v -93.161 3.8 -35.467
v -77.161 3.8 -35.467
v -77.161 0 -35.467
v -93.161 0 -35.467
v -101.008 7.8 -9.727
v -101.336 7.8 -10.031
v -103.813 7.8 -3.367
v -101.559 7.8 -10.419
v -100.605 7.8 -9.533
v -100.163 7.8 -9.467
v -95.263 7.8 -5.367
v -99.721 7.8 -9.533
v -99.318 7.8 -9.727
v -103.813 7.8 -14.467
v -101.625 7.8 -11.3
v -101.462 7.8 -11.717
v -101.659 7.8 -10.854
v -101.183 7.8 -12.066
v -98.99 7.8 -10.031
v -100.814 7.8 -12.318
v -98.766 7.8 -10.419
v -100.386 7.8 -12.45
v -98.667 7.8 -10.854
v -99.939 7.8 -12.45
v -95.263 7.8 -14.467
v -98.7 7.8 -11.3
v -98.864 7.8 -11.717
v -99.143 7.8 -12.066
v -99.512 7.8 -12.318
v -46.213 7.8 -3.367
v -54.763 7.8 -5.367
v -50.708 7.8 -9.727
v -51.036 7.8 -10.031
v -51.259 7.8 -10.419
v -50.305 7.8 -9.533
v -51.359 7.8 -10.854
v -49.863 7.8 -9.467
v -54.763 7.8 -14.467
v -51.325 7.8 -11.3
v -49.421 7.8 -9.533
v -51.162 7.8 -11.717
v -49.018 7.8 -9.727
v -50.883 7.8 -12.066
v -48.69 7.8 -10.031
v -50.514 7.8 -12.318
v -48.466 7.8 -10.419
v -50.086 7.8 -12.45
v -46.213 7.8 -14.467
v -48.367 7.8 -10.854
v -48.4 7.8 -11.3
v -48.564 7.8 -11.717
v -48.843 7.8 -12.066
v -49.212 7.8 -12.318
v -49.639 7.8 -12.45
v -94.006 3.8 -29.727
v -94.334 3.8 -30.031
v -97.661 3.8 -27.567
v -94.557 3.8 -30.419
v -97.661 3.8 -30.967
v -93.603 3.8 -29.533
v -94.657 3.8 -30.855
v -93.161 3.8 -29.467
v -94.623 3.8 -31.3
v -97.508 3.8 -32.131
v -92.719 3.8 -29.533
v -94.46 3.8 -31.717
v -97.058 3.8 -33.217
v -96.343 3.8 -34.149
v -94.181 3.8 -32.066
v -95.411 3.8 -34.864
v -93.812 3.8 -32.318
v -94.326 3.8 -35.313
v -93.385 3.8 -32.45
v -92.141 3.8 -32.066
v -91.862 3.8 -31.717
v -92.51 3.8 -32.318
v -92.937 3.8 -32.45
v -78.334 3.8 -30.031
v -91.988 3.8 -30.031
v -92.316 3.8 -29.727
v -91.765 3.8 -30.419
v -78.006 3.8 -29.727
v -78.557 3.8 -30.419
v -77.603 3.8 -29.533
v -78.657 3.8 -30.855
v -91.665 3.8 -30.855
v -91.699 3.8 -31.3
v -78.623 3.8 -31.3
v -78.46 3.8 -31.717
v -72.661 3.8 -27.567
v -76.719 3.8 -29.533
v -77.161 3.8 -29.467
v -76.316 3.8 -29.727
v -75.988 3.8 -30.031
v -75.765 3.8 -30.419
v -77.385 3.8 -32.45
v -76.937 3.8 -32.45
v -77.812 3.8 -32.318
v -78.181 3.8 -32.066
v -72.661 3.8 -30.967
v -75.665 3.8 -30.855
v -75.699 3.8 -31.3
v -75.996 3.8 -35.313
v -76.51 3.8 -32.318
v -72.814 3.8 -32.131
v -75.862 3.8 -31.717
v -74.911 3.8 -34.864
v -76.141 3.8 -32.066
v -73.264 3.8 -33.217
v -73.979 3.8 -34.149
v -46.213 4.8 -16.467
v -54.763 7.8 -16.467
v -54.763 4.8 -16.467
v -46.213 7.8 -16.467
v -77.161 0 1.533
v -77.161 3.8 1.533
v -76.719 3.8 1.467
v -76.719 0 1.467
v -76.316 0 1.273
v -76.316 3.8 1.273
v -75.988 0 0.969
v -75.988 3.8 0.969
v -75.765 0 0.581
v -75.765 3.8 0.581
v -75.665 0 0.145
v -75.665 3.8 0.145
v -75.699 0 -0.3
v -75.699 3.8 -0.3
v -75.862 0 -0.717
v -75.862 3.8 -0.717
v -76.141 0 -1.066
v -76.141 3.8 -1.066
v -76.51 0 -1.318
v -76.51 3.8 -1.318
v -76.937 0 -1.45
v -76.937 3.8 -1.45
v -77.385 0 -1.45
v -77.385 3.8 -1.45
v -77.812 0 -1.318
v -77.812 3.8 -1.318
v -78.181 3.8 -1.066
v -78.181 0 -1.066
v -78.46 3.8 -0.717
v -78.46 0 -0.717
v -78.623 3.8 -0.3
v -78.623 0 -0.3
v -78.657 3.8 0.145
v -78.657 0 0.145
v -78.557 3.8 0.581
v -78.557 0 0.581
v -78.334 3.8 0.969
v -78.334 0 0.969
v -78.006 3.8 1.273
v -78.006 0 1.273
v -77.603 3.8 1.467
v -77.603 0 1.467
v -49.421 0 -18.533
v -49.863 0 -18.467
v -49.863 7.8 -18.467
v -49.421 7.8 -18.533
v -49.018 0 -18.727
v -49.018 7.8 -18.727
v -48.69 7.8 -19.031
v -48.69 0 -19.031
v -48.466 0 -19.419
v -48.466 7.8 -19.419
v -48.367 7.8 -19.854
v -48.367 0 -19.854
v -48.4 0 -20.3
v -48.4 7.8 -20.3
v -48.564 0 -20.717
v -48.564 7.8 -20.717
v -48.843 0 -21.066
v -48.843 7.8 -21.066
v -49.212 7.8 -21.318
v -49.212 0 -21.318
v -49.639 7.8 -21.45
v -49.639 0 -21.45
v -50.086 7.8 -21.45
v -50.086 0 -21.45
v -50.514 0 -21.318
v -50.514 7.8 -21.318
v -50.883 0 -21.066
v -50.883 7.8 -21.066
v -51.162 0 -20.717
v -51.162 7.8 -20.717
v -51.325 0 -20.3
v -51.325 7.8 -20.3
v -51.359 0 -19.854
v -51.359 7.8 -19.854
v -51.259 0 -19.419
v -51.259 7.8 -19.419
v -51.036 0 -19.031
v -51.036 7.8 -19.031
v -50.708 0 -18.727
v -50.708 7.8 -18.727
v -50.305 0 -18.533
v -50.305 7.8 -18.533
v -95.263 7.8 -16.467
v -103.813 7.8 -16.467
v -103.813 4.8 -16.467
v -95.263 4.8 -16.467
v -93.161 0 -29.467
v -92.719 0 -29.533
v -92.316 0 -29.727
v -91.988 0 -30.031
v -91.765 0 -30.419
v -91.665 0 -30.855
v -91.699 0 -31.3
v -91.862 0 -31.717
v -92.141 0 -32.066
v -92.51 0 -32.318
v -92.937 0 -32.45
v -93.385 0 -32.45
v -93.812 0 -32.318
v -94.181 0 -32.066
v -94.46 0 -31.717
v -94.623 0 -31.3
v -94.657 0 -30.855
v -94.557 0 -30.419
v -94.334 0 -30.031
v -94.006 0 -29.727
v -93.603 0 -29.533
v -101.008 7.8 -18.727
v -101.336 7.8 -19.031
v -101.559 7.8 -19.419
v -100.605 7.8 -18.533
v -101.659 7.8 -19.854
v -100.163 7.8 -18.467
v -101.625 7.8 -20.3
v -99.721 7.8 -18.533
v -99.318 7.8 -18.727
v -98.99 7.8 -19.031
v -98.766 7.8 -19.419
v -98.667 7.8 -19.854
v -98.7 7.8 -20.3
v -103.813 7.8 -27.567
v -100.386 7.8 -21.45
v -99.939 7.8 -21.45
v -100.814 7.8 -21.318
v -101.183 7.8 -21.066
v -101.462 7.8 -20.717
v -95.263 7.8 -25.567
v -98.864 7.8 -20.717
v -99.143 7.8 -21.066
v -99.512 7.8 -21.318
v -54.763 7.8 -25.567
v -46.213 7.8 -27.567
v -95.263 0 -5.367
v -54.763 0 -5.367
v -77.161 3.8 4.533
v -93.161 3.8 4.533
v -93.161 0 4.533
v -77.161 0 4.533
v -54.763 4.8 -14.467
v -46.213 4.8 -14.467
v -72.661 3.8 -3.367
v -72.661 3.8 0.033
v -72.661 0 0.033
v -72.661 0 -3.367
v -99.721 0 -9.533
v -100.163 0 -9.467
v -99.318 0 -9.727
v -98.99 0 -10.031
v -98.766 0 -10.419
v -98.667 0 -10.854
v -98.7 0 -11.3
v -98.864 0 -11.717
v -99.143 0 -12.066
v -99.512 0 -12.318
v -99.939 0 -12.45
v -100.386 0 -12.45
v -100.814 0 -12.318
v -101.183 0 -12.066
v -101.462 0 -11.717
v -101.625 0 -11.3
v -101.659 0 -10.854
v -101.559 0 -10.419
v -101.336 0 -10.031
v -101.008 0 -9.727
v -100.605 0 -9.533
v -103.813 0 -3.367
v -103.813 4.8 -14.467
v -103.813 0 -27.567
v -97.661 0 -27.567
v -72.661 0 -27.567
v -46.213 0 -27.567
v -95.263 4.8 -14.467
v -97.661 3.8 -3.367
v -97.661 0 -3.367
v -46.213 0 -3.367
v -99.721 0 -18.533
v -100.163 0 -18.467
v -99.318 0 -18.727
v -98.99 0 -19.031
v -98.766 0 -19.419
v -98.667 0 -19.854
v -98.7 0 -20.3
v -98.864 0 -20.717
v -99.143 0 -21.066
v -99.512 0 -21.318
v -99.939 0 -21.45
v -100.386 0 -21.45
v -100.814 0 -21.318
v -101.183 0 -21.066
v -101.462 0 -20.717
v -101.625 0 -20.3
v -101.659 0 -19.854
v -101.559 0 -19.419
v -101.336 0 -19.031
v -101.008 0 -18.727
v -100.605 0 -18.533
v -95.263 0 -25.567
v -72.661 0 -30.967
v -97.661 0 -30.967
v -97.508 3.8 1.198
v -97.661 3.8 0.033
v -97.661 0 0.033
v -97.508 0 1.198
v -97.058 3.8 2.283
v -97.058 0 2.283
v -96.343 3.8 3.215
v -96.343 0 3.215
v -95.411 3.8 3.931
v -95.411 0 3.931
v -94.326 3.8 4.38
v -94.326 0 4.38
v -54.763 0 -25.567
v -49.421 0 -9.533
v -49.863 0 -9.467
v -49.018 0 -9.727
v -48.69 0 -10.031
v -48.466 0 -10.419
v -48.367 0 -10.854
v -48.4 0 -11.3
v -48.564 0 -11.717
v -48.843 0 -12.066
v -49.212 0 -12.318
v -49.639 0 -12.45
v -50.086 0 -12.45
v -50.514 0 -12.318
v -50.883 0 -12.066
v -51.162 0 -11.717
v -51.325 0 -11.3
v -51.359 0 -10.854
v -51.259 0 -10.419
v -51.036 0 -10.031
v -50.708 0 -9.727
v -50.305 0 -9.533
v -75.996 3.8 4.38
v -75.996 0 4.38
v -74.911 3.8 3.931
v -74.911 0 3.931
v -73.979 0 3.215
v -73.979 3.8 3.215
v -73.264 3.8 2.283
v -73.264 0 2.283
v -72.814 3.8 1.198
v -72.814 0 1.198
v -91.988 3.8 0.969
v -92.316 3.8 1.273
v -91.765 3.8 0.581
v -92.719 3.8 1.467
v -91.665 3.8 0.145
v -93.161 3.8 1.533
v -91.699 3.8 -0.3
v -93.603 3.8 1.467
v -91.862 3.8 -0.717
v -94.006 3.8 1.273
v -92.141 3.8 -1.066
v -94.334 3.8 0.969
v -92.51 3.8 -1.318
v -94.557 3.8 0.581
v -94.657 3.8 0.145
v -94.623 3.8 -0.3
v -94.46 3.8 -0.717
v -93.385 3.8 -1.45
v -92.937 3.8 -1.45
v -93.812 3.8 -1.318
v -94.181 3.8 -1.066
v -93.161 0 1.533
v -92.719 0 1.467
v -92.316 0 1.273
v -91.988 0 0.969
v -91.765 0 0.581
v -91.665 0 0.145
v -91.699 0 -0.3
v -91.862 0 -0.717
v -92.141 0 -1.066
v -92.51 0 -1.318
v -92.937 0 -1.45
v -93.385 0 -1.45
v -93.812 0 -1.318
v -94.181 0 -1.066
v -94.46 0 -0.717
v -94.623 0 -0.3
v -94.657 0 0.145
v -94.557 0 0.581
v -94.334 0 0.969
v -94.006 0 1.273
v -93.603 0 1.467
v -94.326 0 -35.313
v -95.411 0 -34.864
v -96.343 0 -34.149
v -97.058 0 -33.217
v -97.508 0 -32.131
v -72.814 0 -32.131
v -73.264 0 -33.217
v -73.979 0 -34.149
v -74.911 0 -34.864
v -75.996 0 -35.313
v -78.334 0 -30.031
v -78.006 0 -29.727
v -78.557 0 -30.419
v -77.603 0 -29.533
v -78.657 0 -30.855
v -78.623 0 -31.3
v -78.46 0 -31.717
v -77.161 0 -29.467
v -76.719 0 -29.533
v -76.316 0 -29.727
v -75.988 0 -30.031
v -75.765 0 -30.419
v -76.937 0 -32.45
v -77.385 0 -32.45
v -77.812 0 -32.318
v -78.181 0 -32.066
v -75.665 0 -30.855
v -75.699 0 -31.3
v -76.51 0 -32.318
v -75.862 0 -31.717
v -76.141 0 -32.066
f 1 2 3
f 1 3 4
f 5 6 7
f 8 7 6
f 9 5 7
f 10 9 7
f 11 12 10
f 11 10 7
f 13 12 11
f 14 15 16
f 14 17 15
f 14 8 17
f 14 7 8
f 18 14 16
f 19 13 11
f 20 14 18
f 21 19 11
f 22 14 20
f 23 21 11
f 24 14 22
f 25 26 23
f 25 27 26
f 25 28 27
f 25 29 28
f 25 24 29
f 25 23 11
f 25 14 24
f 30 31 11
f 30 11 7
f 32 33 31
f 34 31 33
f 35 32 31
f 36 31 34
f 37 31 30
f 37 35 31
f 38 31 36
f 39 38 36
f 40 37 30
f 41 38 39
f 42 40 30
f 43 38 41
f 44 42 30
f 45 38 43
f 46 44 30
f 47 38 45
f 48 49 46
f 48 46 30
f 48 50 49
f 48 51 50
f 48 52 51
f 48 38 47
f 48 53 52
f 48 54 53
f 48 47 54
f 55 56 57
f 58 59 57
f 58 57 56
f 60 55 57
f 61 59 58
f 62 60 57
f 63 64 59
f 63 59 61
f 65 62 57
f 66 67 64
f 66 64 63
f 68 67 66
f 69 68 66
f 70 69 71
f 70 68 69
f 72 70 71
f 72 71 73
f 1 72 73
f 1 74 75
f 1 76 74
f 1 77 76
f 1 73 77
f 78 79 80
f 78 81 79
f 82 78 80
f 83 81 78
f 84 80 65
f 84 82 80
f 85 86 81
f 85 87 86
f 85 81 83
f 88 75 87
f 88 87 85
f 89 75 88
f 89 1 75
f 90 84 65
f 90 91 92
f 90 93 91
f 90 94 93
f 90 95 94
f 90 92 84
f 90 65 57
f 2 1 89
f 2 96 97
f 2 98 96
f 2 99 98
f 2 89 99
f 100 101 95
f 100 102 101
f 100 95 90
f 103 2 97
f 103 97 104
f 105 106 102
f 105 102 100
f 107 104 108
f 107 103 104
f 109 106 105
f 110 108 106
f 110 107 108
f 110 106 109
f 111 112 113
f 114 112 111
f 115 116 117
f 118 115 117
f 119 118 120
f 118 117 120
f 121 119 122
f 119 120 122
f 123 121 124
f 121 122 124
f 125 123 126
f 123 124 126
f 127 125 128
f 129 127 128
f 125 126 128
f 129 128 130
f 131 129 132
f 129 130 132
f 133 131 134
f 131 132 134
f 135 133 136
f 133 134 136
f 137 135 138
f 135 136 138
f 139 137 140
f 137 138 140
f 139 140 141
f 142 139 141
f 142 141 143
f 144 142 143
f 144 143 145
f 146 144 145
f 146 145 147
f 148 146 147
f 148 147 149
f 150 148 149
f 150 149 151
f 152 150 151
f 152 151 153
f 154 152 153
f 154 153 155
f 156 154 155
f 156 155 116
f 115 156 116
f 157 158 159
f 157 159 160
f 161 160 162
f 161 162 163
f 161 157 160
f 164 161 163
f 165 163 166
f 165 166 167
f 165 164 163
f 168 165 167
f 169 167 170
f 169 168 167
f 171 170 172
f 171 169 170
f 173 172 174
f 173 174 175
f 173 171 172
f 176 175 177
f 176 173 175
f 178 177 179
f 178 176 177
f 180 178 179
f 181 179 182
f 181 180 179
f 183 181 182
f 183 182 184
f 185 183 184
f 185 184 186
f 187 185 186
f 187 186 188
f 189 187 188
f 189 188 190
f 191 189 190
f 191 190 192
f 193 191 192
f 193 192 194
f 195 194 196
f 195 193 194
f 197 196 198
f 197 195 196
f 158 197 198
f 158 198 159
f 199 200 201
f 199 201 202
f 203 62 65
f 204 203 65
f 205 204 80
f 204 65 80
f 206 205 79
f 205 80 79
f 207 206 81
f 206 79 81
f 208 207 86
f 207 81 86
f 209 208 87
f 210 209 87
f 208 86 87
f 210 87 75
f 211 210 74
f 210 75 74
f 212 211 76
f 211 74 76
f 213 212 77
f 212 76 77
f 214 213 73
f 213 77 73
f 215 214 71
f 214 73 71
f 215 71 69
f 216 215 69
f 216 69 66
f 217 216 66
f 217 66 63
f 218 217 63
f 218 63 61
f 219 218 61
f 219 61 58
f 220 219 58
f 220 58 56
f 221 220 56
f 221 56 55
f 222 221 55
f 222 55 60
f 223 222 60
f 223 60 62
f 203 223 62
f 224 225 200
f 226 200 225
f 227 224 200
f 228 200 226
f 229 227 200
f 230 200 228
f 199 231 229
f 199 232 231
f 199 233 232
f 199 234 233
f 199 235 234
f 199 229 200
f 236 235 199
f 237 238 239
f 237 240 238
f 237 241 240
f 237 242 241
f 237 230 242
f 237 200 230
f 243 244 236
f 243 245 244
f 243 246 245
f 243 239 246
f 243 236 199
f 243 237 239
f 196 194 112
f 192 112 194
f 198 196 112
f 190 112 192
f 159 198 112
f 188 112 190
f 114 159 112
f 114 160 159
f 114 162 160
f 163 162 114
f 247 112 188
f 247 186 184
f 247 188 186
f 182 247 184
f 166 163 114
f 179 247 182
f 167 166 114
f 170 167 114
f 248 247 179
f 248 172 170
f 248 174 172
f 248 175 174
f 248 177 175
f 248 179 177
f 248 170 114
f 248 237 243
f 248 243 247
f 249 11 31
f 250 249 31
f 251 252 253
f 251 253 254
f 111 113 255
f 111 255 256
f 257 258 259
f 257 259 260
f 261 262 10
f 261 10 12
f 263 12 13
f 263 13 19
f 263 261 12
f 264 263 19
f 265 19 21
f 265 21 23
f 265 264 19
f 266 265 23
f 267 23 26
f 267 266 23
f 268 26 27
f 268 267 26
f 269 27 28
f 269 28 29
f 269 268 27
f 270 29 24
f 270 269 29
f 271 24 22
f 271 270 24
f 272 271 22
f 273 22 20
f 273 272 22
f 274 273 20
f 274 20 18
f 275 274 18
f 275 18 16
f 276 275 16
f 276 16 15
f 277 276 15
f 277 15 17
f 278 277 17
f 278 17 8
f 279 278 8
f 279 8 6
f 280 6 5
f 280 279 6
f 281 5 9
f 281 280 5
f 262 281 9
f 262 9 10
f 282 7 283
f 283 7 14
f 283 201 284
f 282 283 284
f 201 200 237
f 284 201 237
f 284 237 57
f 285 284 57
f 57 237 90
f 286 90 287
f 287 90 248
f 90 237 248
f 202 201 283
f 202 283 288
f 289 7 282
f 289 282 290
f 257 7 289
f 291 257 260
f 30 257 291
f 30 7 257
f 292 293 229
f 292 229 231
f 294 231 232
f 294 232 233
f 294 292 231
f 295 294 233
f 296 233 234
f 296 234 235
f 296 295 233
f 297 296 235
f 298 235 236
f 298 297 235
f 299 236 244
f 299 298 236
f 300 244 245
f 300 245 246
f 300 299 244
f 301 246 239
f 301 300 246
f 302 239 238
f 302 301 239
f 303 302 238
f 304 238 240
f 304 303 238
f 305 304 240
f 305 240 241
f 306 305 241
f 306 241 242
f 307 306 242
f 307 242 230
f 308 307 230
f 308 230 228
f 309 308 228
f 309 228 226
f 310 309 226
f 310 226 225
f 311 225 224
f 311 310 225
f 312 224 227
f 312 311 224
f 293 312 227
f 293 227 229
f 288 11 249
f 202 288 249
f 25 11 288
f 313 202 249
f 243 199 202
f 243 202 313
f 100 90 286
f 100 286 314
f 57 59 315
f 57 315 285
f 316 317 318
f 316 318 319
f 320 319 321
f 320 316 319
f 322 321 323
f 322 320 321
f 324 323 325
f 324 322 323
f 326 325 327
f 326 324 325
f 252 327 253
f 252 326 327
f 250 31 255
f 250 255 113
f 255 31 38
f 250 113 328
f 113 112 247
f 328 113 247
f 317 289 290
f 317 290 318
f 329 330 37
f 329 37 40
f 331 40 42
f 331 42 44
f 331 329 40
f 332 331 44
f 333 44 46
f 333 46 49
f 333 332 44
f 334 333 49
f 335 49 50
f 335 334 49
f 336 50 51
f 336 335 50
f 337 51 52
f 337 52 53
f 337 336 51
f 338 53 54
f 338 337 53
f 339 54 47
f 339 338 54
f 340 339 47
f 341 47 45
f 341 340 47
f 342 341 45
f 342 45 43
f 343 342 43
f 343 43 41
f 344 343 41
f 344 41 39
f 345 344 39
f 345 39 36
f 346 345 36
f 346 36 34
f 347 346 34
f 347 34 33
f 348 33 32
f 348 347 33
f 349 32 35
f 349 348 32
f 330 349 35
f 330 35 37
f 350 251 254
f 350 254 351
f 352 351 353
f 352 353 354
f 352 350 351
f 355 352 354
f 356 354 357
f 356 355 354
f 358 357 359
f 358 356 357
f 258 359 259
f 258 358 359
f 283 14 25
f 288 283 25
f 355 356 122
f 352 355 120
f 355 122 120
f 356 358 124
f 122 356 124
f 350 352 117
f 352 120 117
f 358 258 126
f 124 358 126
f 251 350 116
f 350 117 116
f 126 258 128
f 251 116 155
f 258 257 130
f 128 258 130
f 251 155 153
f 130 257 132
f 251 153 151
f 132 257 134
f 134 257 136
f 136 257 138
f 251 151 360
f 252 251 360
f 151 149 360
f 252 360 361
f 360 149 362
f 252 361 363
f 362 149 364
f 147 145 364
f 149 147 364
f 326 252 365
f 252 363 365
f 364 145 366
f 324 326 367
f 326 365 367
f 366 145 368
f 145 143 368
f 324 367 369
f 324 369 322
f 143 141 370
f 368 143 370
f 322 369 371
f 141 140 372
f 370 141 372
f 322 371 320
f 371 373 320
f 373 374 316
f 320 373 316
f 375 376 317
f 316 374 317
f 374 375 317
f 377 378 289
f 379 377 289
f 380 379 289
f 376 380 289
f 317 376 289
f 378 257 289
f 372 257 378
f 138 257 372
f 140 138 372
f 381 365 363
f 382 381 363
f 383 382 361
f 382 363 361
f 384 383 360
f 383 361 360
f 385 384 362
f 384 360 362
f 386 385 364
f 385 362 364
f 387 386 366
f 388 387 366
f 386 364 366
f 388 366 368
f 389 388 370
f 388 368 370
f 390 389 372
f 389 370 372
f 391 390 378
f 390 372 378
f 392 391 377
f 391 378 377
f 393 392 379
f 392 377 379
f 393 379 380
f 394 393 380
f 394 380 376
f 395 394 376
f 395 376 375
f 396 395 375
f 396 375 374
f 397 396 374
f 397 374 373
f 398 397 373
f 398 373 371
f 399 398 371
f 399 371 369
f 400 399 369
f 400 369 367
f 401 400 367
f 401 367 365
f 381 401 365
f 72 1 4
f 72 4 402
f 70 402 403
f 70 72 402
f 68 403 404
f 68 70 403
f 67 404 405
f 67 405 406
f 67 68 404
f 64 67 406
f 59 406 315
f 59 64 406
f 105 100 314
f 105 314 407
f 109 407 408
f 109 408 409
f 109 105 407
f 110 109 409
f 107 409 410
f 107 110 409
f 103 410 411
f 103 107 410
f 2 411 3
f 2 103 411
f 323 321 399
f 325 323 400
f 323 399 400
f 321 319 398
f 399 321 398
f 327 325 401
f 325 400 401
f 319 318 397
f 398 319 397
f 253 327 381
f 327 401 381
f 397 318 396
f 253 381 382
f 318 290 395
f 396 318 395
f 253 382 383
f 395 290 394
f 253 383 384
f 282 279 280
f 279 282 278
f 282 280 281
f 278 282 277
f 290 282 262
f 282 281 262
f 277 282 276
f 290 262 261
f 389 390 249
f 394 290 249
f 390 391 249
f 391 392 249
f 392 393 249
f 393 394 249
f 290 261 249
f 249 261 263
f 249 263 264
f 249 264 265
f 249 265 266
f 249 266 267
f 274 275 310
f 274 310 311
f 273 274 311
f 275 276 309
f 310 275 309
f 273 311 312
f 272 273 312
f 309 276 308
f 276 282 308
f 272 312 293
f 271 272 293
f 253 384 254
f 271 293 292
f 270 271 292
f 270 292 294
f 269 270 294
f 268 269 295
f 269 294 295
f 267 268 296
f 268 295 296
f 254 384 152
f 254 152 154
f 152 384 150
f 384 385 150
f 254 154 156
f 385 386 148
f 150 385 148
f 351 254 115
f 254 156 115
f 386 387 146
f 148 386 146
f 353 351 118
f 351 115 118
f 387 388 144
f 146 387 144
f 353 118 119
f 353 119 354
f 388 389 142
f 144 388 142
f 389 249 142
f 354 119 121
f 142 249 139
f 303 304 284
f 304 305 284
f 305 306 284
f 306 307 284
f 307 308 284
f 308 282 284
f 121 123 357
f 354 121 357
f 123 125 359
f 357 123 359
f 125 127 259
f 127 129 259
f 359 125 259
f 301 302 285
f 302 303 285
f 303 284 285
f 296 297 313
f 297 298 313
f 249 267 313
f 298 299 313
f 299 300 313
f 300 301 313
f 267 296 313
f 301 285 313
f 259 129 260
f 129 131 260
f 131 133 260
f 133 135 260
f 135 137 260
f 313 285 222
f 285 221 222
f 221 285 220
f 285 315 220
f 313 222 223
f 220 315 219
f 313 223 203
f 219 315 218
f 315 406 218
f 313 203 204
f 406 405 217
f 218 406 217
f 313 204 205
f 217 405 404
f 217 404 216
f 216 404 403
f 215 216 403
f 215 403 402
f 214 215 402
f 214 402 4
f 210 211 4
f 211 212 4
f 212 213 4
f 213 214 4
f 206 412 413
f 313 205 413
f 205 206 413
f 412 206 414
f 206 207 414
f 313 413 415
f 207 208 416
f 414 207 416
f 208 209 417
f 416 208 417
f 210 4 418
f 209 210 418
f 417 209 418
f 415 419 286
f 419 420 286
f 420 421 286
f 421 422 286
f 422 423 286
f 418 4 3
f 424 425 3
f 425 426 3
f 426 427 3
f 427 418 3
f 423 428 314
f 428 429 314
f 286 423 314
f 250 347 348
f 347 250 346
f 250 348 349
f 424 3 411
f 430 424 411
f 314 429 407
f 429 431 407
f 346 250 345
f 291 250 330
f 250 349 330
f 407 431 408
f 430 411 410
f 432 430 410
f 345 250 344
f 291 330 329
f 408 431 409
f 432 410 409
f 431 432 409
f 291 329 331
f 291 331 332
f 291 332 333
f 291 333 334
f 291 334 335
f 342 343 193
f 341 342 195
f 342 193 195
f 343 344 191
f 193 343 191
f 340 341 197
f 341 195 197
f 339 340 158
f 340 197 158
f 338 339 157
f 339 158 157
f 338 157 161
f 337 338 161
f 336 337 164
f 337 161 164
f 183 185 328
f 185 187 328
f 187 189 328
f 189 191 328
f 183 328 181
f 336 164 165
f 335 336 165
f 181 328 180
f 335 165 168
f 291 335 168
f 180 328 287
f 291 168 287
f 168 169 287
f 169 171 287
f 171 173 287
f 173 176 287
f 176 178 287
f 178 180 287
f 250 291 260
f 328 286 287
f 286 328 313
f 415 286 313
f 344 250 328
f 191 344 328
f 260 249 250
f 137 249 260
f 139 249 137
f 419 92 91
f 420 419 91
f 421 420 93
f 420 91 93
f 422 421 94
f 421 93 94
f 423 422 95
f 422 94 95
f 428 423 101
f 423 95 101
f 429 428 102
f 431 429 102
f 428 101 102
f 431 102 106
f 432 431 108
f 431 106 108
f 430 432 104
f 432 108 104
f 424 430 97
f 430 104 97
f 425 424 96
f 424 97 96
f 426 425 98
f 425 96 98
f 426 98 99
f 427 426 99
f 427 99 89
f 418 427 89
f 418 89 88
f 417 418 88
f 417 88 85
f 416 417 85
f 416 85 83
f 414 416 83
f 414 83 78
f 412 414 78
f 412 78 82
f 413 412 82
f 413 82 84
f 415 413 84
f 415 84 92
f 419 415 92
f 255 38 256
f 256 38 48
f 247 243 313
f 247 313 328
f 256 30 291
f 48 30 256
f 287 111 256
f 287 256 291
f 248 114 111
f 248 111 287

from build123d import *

# Parameters (mm, degrees)
SKETCH1_R             = 1.5
BOSS_EXTRUDE1_DEPTH   = 7.8
BOSS_EXTRUDE1_2_DEPTH = 7.8
SKETCH2_W             = 2
SKETCH2_H             = 20
BOSS_EXTRUDE2_DEPTH   = 7.8
SKETCH3_W             = 8.55
SKETCH3_H             = 0.1
BOSS_EXTRUDE3_DEPTH   = 7.8
SKETCH4_W             = 57.6
SKETCH4_H             = 2
BOSS_EXTRUDE4_DEPTH   = 7.8
SKETCH5_W             = 8.55
SKETCH5_H             = 2
CUT_EXTRUDE1_DEPTH    = 3
SKETCH6_R             = 1.5
BOSS_EXTRUDE5_DEPTH   = 7.8
SKETCH7_R             = 1.5
CUT_EXTRUDE2_DEPTH    = 4


with BuildPart() as part:
    # Sketch1 → Boss-Extrude1 (new body)
    with BuildSketch(Plane(origin=(0, 0, 0), x_dir=(1, 0, 0), z_dir=(0, 1, 0))):
        Polygon((-54.762761852, 25.466548835), (-54.762761852, 5.466548835), (-48.212761852, 5.466548835), (-48.212761852, 12.451776091), (-48.212761852, 18.48132158), (-48.212761852, 25.466548835), align=None)
        with Locations(Location((-49.862761852, 10.966548835, 0), (0, 0, 270))):
            Circle(SKETCH1_R, mode=Mode.SUBTRACT)
        with Locations(Location((-49.862761852, 19.966548835, 0), (0, 0, 270))):
            Circle(SKETCH1_R, mode=Mode.SUBTRACT)
    extrude(amount=BOSS_EXTRUDE1_DEPTH)



with BuildPart() as body_2:
    # Sketch1 → Boss-Extrude1 2 (new body)
    with BuildSketch(Plane(origin=(0, 0, 0), x_dir=(1, 0, 0), z_dir=(0, 1, 0))):
        Polygon((-101.812761852, 18.48132158), (-101.812761852, 12.451776091), (-101.812761852, 5.466548835), (-101.212761852, 5.466548835), (-95.262761852, 5.466548835), (-95.262761852, 25.466548835), (-101.812761852, 25.466548835), (-101.812761852, 24.866548835), (-101.812761852, 21.451776091), align=None)
        with Locations(Location((-100.162761852, 10.966548835, 0), (0, 0, 270))):
            Circle(SKETCH1_R, mode=Mode.SUBTRACT)
        with Locations(Location((-100.162761852, 19.966548835, 0), (0, 0, 270))):
            Circle(SKETCH1_R, mode=Mode.SUBTRACT)
    extrude(amount=BOSS_EXTRUDE1_2_DEPTH)


with BuildPart() as part_1:
    add(part.part)

    add(body_2.part)  # Boss-Extrude2 merges body 2
    # Sketch2 → Boss-Extrude2 (add)
    with BuildSketch(Plane(origin=(0, 7.8, 0), x_dir=(1, 0, 0), z_dir=(0, 1, 0))):
        with Locations((-47.212761852, 15.466548835)):
            Rectangle(SKETCH2_W, SKETCH2_H)
        with Locations((-102.812761852, 15.466548835)):
            Rectangle(SKETCH2_W, SKETCH2_H)
    extrude(amount=-BOSS_EXTRUDE2_DEPTH)

    # Sketch3 → Boss-Extrude3 (add)
    with BuildSketch(Plane(origin=(0, 7.8, 0), x_dir=(1, 0, 0), z_dir=(0, 1, 0))):
        with Locations((-99.537761852, 5.416548835)):
            Rectangle(SKETCH3_W, SKETCH3_H)
        with Locations((-99.537761852, 25.516548835)):
            Rectangle(SKETCH3_W, SKETCH3_H)
        with Locations((-50.487761852, 25.516548835)):
            Rectangle(SKETCH3_W, SKETCH3_H)
        with Locations((-50.487761852, 5.416548835)):
            Rectangle(SKETCH3_W, SKETCH3_H)
    extrude(amount=-BOSS_EXTRUDE3_DEPTH)

    # Sketch4 → Boss-Extrude4 (add)
    with BuildSketch(Plane(origin=(0, 7.8, 0), x_dir=(1, 0, 0), z_dir=(0, 1, 0))):
        with Locations((-75.012761852, 26.566548835)):
            Rectangle(SKETCH4_W, SKETCH4_H)
        with Locations((-75.012761852, 4.366548835)):
            Rectangle(SKETCH4_W, SKETCH4_H)
    extrude(amount=-BOSS_EXTRUDE4_DEPTH)

    # Sketch5 → Cut-Extrude1 (cut)
    with BuildSketch(Plane(origin=(0, 7.8, 0), x_dir=(1, 0, 0), z_dir=(0, 1, 0))):
        with Locations((-99.537761852, 15.466548835)):
            Rectangle(SKETCH5_W, SKETCH5_H)
        with Locations((-50.487761852, 15.466548835)):
            Rectangle(SKETCH5_W, SKETCH5_H)
    extrude(amount=-CUT_EXTRUDE1_DEPTH, mode=Mode.SUBTRACT)

    # Sketch6 → Boss-Extrude5 (add)
    # profile 1 of 10: a face of its own
    with BuildSketch(Plane(origin=(0, 7.8, 0), x_dir=(1, 0, 0), z_dir=(0, 1, 0))):
        with BuildLine():
            Line((-97.660965944, 3.366548835), (-97.660965944, -0.033392238))
            ThreePointArc((-97.660965944, -0.033392238), (-97.254605431, 1.835328112), (-96.108914501, 3.366548835))
            Line((-96.108914501, 3.366548835), (-97.660965944, 3.366548835))
        make_face()
    # profile 2 of 10: a face of its own
    with BuildSketch(Plane(origin=(0, 7.8, 0), x_dir=(1, 0, 0), z_dir=(0, 1, 0))):
        with BuildLine():
            ThreePointArc((-96.108914501, 3.366548835), (-97.254605431, 1.835328112), (-97.660965944, -0.033392238))
            ThreePointArc((-97.660965944, -0.033392238), (-96.342946459, -3.215372753), (-93.160965944, -4.533392238))
            ThreePointArc((-93.160965944, -4.533392238), (-89.978985428, -3.215372753), (-88.660965944, -0.033392238))
            ThreePointArc((-88.660965944, -0.033392238), (-89.067326456, 1.835328112), (-90.213017386, 3.366548835))
            Line((-90.213017386, 3.366548835), (-96.108914501, 3.366548835))
        make_face()
        with Locations(Location((-93.160965944, -0.033392238, 0), (0, 0, 270))):
            Circle(SKETCH6_R, mode=Mode.SUBTRACT)
    # profile 3 of 10: a face of its own
    with BuildSketch(Plane(origin=(0, 7.8, 0), x_dir=(1, 0, 0), z_dir=(0, 1, 0))):
        with BuildLine():
            ThreePointArc((-88.660965944, -0.033392238), (-89.978985428, -3.215372753), (-93.160965944, -4.533392238))
            Line((-93.160965944, -4.533392238), (-77.160965417, -4.533392238))
            ThreePointArc((-77.160965417, -4.533392238), (-81.376990489, -1.606647648), (-80.108913974, 3.366548835))
            Line((-80.108913974, 3.366548835), (-90.213017386, 3.366548835))
            ThreePointArc((-90.213017386, 3.366548835), (-89.067326456, 1.835328112), (-88.660965944, -0.033392238))
        make_face()
    # profile 4 of 10: a face of its own
    with BuildSketch(Plane(origin=(0, 7.8, 0), x_dir=(1, 0, 0), z_dir=(0, 1, 0))):
        with BuildLine():
            ThreePointArc((-80.108913974, 3.366548835), (-81.376990489, -1.606647648), (-77.160965417, -4.533392238))
            ThreePointArc((-77.160965417, -4.533392238), (-73.978984901, -3.215372753), (-72.660965417, -0.033392238))
            ThreePointArc((-72.660965417, -0.033392238), (-73.067325929, 1.835328112), (-74.213016859, 3.366548835))
            Line((-74.213016859, 3.366548835), (-80.108913974, 3.366548835))
        make_face()
        with Locations(Location((-77.160965417, -0.033392238, 0), (0, 0, 270))):
            Circle(SKETCH6_R, mode=Mode.SUBTRACT)
    # profile 5 of 10: a face of its own
    with BuildSketch(Plane(origin=(0, 7.8, 0), x_dir=(1, 0, 0), z_dir=(0, 1, 0))):
        with BuildLine():
            ThreePointArc((-74.213016859, 3.366548835), (-73.067325929, 1.835328112), (-72.660965417, -0.033392238))
            Line((-72.660965417, -0.033392238), (-72.660965417, 3.366548835))
            Line((-72.660965417, 3.366548835), (-74.213016859, 3.366548835))
        make_face()
    # profile 6 of 10: a face of its own
    with BuildSketch(Plane(origin=(0, 7.8, 0), x_dir=(1, 0, 0), z_dir=(0, 1, 0))):
        with BuildLine():
            ThreePointArc((-72.660965417, 30.966605859), (-73.978984901, 34.148586374), (-77.160965417, 35.466605859))
            ThreePointArc((-77.160965417, 35.466605859), (-81.377021429, 32.539778353), (-80.108780241, 27.566548835))
            Line((-80.108780241, 27.566548835), (-74.213150592, 27.566548835))
            ThreePointArc((-74.213150592, 27.566548835), (-73.067362681, 29.097805001), (-72.660965417, 30.966605859))
        make_face()
        with Locations(Location((-77.160965417, 30.966605859, 0), (0, 0, 270))):
            Circle(SKETCH6_R, mode=Mode.SUBTRACT)
    # profile 7 of 10: a face of its own
    with BuildSketch(Plane(origin=(0, 7.8, 0), x_dir=(1, 0, 0), z_dir=(0, 1, 0))):
        with BuildLine():
            Line((-74.213150592, 27.566548835), (-72.660965417, 27.566548835))
            Line((-72.660965417, 27.566548835), (-72.660965417, 30.966605859))
            ThreePointArc((-72.660965417, 30.966605859), (-73.067362681, 29.097805001), (-74.213150592, 27.566548835))
        make_face()
    # profile 8 of 10: a face of its own
    with BuildSketch(Plane(origin=(0, 7.8, 0), x_dir=(1, 0, 0), z_dir=(0, 1, 0))):
        with BuildLine():
            Line((-77.160965417, 35.466605859), (-93.160965944, 35.466605859))
            ThreePointArc((-93.160965944, 35.466605859), (-89.978985428, 34.148586374), (-88.660965944, 30.966605859))
            ThreePointArc((-88.660965944, 30.966605859), (-89.067363208, 29.097805001), (-90.213151119, 27.566548835))
            Line((-90.213151119, 27.566548835), (-80.108780241, 27.566548835))
            ThreePointArc((-80.108780241, 27.566548835), (-81.377021429, 32.539778353), (-77.160965417, 35.466605859))
        make_face()
    # profile 9 of 10: a face of its own
    with BuildSketch(Plane(origin=(0, 7.8, 0), x_dir=(1, 0, 0), z_dir=(0, 1, 0))):
        with BuildLine():
            ThreePointArc((-93.160965944, 35.466605859), (-96.342946459, 34.148586374), (-97.660965944, 30.966605859))
            ThreePointArc((-97.660965944, 30.966605859), (-97.254568679, 29.097805001), (-96.108780768, 27.566548835))
            Line((-96.108780768, 27.566548835), (-90.213151119, 27.566548835))
            ThreePointArc((-90.213151119, 27.566548835), (-89.067363208, 29.097805001), (-88.660965944, 30.966605859))
            ThreePointArc((-88.660965944, 30.966605859), (-89.978985428, 34.148586374), (-93.160965944, 35.466605859))
        make_face()
        with Locations(Location((-93.160965944, 30.966605859, 0), (0, 0, 270))):
            Circle(SKETCH6_R, mode=Mode.SUBTRACT)
    # profile 10 of 10: a face of its own
    with BuildSketch(Plane(origin=(0, 7.8, 0), x_dir=(1, 0, 0), z_dir=(0, 1, 0))):
        with BuildLine():
            Line((-97.660965944, 30.966605859), (-97.660965944, 27.566548835))
            Line((-97.660965944, 27.566548835), (-96.108780768, 27.566548835))
            ThreePointArc((-96.108780768, 27.566548835), (-97.254568679, 29.097805001), (-97.660965944, 30.966605859))
        make_face()
    extrude(amount=-BOSS_EXTRUDE5_DEPTH)

    # Sketch7 → Cut-Extrude2 (cut)
    # profile 1 of 2: a face of its own
    with BuildSketch(Plane(origin=(0, 7.8, 0), x_dir=(1, 0, 0), z_dir=(0, 1, 0))):
        with BuildLine():
            Line((-97.660965944, 3.366548835), (-72.660965417, 3.366548835))
            Line((-72.660965417, 3.366548835), (-72.660965417, -0.033392238))
            ThreePointArc((-72.660965417, -0.033392238), (-73.978984901, -3.215372753), (-77.160965417, -4.533392238))
            Line((-77.160965417, -4.533392238), (-93.160965944, -4.533392238))
            ThreePointArc((-93.160965944, -4.533392238), (-96.342946459, -3.215372753), (-97.660965944, -0.033392238))
            Line((-97.660965944, -0.033392238), (-97.660965944, 3.366548835))
        make_face()
        with Locations(Location((-77.160965417, -0.033392238, 0), (0, 0, 270))):
            Circle(SKETCH7_R, mode=Mode.SUBTRACT)
        with Locations(Location((-93.160965944, -0.033392238, 0), (0, 0, 270))):
            Circle(SKETCH7_R, mode=Mode.SUBTRACT)
    # profile 2 of 2: a face of its own
    with BuildSketch(Plane(origin=(0, 7.8, 0), x_dir=(1, 0, 0), z_dir=(0, 1, 0))):
        with BuildLine():
            Line((-77.160965417, 35.466605859), (-93.160965944, 35.466605859))
            ThreePointArc((-93.160965944, 35.466605859), (-96.342946459, 34.148586374), (-97.660965944, 30.966605859))
            Line((-97.660965944, 30.966605859), (-97.660965944, 27.566548835))
            Line((-97.660965944, 27.566548835), (-72.660965417, 27.566548835))
            Line((-72.660965417, 27.566548835), (-72.660965417, 30.966605859))
            ThreePointArc((-72.660965417, 30.966605859), (-73.978984901, 34.148586374), (-77.160965417, 35.466605859))
        make_face()
    extrude(amount=-CUT_EXTRUDE2_DEPTH, mode=Mode.SUBTRACT)


solid = part_1.part
